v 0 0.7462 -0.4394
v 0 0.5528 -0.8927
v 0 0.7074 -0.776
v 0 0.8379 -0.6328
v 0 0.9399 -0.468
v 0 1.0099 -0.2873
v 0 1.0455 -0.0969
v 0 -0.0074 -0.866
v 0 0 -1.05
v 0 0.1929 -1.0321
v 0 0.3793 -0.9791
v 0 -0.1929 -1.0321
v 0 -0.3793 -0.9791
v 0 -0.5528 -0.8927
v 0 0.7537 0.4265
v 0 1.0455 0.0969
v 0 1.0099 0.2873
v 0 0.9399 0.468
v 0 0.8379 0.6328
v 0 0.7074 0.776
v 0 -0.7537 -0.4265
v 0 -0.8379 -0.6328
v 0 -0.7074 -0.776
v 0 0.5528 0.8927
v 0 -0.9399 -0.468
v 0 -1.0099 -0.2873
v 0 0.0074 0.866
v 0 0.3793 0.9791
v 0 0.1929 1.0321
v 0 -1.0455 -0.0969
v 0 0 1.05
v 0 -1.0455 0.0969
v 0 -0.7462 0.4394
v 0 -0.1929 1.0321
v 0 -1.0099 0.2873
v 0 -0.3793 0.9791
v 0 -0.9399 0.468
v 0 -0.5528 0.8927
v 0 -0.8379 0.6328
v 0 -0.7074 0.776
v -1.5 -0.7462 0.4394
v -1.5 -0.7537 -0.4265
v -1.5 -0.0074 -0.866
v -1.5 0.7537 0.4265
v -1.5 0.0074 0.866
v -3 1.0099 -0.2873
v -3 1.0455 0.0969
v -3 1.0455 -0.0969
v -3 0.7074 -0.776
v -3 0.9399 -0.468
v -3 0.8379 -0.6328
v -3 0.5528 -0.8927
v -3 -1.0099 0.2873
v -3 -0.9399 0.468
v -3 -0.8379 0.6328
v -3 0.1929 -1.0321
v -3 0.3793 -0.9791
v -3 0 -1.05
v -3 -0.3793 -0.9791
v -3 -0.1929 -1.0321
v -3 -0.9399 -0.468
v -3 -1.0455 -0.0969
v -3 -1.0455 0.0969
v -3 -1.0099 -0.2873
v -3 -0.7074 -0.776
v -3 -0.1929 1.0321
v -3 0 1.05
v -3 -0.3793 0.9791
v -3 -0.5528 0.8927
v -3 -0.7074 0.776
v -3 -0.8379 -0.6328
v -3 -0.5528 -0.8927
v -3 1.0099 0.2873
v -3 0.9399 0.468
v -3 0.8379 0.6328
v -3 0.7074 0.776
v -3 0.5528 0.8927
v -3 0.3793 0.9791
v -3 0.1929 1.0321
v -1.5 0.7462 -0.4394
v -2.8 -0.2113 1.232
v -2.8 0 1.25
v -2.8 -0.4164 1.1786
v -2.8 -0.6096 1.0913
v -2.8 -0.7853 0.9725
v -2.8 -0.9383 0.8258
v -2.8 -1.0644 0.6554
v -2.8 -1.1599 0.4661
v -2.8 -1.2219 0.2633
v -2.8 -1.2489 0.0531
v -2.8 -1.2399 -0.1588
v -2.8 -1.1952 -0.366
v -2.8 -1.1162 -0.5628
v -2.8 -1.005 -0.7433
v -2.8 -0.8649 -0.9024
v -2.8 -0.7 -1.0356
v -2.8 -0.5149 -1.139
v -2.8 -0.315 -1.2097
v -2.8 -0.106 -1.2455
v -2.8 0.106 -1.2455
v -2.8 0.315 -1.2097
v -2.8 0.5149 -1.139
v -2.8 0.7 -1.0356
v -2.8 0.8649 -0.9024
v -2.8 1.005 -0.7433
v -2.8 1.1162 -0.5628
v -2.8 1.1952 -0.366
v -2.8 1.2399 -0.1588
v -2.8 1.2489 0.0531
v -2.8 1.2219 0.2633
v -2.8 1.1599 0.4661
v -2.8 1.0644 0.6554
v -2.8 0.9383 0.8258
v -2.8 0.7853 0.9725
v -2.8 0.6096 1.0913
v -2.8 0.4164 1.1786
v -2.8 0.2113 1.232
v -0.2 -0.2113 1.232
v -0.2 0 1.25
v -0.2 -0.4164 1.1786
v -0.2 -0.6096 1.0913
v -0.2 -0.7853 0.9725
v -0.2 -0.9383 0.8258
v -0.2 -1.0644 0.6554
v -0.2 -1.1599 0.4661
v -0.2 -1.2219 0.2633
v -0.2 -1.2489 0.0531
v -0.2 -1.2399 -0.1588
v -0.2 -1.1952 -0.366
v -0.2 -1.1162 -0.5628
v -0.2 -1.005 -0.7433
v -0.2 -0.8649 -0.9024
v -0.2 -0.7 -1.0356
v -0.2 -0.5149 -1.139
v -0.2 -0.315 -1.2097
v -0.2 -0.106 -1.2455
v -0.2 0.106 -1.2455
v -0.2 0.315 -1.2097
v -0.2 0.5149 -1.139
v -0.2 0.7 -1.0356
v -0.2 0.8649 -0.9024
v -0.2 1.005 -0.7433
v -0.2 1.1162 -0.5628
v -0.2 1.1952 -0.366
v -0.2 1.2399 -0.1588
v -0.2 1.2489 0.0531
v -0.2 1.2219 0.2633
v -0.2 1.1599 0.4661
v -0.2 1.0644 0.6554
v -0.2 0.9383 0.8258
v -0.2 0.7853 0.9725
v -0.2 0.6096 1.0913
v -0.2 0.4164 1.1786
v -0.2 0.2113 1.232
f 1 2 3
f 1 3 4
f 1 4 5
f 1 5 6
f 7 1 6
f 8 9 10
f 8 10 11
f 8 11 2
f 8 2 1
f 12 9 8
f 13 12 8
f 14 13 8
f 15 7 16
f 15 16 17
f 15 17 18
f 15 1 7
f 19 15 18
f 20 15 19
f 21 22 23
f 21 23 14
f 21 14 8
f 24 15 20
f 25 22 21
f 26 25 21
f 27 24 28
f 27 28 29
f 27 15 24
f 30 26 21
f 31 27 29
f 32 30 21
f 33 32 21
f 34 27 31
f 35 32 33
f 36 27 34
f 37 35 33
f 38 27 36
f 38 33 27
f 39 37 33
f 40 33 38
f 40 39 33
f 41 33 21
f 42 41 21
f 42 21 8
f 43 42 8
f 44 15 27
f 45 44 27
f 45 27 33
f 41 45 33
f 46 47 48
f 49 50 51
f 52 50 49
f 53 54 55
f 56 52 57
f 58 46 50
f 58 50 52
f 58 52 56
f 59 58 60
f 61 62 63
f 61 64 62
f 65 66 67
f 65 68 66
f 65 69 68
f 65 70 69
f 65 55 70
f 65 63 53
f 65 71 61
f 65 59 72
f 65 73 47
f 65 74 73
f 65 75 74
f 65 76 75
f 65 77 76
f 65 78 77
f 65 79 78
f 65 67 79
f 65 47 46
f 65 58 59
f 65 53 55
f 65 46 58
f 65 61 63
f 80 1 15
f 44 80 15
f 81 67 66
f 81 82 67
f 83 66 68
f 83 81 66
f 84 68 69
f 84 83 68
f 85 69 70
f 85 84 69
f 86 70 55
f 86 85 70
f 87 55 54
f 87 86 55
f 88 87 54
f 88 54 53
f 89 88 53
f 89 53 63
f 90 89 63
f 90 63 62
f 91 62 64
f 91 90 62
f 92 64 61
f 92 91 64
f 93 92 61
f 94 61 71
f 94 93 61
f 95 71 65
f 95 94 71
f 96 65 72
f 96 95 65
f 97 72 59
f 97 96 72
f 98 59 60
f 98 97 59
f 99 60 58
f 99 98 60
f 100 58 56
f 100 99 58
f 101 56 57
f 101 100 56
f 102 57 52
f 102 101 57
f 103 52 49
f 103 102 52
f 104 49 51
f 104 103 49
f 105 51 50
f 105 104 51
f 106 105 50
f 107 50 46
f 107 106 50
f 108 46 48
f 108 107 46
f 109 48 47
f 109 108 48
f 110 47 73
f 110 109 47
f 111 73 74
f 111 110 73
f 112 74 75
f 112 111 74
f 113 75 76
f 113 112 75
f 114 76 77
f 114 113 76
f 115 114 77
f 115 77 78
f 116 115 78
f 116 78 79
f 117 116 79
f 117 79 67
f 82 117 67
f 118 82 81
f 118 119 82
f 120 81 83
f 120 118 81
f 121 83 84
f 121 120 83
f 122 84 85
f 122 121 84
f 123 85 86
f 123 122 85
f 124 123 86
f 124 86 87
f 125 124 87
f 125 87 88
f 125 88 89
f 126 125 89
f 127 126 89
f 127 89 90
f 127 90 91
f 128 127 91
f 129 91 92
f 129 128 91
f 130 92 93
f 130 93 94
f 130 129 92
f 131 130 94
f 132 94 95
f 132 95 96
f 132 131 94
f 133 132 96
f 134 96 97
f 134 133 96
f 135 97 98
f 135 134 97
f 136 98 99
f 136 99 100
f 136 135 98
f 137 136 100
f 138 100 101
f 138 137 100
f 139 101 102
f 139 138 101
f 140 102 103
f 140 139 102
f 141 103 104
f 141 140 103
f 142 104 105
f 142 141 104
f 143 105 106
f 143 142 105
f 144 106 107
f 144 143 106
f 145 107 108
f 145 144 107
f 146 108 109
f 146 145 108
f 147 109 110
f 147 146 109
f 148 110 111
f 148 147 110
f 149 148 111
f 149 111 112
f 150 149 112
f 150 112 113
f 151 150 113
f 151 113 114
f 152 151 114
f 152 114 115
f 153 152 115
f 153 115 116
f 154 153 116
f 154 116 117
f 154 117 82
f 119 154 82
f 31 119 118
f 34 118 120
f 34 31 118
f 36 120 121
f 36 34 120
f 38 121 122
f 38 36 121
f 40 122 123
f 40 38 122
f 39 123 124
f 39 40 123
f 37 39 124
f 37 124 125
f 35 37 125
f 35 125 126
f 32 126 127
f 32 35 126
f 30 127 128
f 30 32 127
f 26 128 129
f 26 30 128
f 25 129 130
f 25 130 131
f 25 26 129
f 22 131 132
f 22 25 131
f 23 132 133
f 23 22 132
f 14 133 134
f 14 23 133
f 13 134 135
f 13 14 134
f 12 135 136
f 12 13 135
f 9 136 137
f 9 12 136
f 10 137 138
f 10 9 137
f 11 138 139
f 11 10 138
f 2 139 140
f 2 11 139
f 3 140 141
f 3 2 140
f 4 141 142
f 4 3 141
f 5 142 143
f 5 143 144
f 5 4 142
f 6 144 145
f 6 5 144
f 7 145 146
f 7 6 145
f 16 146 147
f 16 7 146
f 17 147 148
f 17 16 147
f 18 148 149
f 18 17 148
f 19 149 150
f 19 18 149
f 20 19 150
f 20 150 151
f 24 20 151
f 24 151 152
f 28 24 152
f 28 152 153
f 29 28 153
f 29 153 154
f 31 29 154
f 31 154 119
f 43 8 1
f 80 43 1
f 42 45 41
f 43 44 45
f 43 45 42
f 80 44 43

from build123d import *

# Parameters (mm, degrees)
ENL_V_MAT_EXTRU_1_DEPTH = 1.5


with BuildPart() as part:
    # Esquisse1 → Révolution1 (revolve)
    with BuildSketch(Plane.XY, mode=Mode.PRIVATE) as r_volution1_sk:
        Polygon((-3, 0), (-3, 1.05), (-2.8, 1.25), (-0.2, 1.25), (0, 1.05), (0, 0), align=None)
    revolve(r_volution1_sk.sketch.rotate(Axis((-47.127645023, 0, 0), (1, 0, 0)), 90), axis=Axis((-47.127645023, 0, 0), (1, 0, 0)))

    # Esquisse2 → Enlèv. mat.-Extru.1 (cut)
    with BuildSketch(Plane(origin=(0, 0, 0), x_dir=(0, 0, -1), z_dir=(1, 0, 0))):
        Polygon((0.439447908, 0.746247638), (-0.426545458, 0.75369687), (-0.865993365, 0.007449233), (-0.439447908, -0.746247638), (0.426545458, -0.75369687), (0.865993365, -0.007449233), align=None)
    extrude(amount=-ENL_V_MAT_EXTRU_1_DEPTH, mode=Mode.SUBTRACT)


solid = part.part
